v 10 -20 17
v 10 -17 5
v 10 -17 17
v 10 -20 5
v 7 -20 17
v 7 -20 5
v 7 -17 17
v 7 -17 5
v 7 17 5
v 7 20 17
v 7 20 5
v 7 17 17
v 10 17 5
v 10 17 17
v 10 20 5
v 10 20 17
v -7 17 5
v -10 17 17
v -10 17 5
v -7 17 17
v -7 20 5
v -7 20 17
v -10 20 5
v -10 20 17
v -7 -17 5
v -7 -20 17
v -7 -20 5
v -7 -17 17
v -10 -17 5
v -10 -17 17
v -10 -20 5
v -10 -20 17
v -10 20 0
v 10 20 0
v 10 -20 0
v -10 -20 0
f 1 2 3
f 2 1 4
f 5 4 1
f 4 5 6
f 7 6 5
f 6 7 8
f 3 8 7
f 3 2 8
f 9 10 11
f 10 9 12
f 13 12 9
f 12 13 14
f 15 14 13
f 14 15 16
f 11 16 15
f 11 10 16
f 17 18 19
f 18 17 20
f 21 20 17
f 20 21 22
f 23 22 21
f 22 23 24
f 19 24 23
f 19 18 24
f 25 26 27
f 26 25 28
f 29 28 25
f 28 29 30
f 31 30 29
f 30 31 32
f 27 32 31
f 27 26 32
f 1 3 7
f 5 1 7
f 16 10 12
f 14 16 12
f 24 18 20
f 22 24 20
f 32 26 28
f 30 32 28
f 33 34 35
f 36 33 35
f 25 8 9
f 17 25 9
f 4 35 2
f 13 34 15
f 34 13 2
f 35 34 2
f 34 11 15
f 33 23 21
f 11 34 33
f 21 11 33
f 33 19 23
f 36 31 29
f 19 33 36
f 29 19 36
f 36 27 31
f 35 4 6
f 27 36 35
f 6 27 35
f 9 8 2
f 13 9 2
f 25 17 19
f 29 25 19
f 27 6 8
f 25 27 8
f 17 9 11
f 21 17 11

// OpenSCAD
// parameters table top

length = 40;
width  =20;
depth = 5;

// parameters  for legs  - legs have square cross section
// all distances are in mm

cross =3;
leg_length =12;




echo(" length table is ", length, " mm");
 echo(" width table is ", width, " mm");
echo(" depth table top is ", depth, " mm");
 echo(" width table leg is ", cross, " mm");
 echo(" height table leg is ", leg_length, " mm");
 echo(" overall height table  is ", leg_length + depth, " mm");




table();


l = length/2;
w = width/2;


module table()
{

/*
   polyhedron command 
  by pmoews
*/
polyhedron
       (points = [
                 [ -w,  l, 0],
                 [ -w, -l, 0],
                 [  w, -l, 0],
                 [  w,  l, 0],
                 [ -w,  l,  depth],
                 [ -w, -l,  depth],
                 [  w, -l,  depth],
                 [  w,  l,  depth],
                 [  w-cross, -l,  depth],
                 [  w-cross, cross-l,  depth],
                 [  w, cross-l,  depth],
                 [  w, -l,  leg_length + depth],
                 [  w-cross, -l,  leg_length + depth],
                 [  w-cross, cross-l,  leg_length + depth],
                 [  w, cross-l,  leg_length + depth],
                 [  w,  l-cross,  depth],
                 [  w-cross,  l-cross,  depth],
                 [  w-cross,  l,  depth],
                 [  w,  l,  leg_length + depth],
                 [  w,  l-cross,  leg_length + depth],
                 [  w-cross,  l-cross,  leg_length + depth],
                 [  w-cross,  l,  leg_length + depth],
                 [ cross-w,  l,  depth],
                 [ cross-w,  l-cross,  depth],
                 [ -w,  l-cross,  depth],
                 [ -w,  l,  leg_length + depth],
                 [ cross-w,  l,  leg_length + depth],
                 [ cross-w,  l-cross,  leg_length + depth],
                 [ -w,  l-cross,  leg_length + depth],
                 [ -w, cross-l,  depth],
                 [ cross-w, cross-l,  depth],
                 [ cross-w, -l,  depth],
                 [ -w, -l,  leg_length + depth],
                 [ -w, cross-l,  leg_length + depth],
                 [ cross-w, cross-l,  leg_length + depth],
                 [ cross-w, -l,  leg_length + depth],
                ],
           triangles = [
                 [   14,   10,   11],[    6,   11,   10],
                 [   11,    6,   12],[    8,   12,    6],
                 [   12,    8,   13],[    9,   13,    8],
                 [   13,    9,   14],[    9,   10,   14],
                 [   17,   21,   16],[   20,   16,   21],
                 [   16,   20,   15],[   19,   15,   20],
                 [   15,   19,    7],[   18,    7,   19],
                 [    7,   18,   17],[   18,   21,   17],
                 [   24,   28,   23],[   27,   23,   28],
                 [   23,   27,   22],[   26,   22,   27],
                 [   22,   26,    4],[   25,    4,   26],
                 [    4,   25,   24],[   25,   28,   24],
                 [   31,   35,   30],[   34,   30,   35],
                 [   30,   34,   29],[   33,   29,   34],
                 [   29,   33,    5],[   32,    5,   33],
                 [    5,   32,   31],[   32,   35,   31],
                 [   13,   14,   11],[   13,   11,   12],
                 [   20,   21,   18],[   20,   18,   19],
                 [   27,   28,   25],[   27,   25,   26],
                 [   34,   35,   32],[   34,   32,   33],
                 [    2,    3,    0],[    2,    0,    1],
                 [   16,    9,   30],[   16,   30,   23],
                 [   10,    2,    6],[    7,    3,   15],
                 [   10,   15,    3],[   10,    3,    2],
                 [    7,   17,    3],[   22,    4,    0],
                 [    0,    3,   17],[    0,   17,   22],
                 [    4,   24,    0],[   29,    5,    1],
                 [    1,    0,   24],[    1,   24,   29],
                 [    5,   31,    1],[    8,    6,    2],
                 [    2,    1,   31],[    2,   31,    8],
                 [   10,    9,   16],[   10,   16,   15],
                 [   24,   23,   30],[   24,   30,   29],
                 [    9,    8,   31],[    9,   31,   30],
                 [   17,   16,   23],[   17,   23,   22],
                 ]
      );

}
